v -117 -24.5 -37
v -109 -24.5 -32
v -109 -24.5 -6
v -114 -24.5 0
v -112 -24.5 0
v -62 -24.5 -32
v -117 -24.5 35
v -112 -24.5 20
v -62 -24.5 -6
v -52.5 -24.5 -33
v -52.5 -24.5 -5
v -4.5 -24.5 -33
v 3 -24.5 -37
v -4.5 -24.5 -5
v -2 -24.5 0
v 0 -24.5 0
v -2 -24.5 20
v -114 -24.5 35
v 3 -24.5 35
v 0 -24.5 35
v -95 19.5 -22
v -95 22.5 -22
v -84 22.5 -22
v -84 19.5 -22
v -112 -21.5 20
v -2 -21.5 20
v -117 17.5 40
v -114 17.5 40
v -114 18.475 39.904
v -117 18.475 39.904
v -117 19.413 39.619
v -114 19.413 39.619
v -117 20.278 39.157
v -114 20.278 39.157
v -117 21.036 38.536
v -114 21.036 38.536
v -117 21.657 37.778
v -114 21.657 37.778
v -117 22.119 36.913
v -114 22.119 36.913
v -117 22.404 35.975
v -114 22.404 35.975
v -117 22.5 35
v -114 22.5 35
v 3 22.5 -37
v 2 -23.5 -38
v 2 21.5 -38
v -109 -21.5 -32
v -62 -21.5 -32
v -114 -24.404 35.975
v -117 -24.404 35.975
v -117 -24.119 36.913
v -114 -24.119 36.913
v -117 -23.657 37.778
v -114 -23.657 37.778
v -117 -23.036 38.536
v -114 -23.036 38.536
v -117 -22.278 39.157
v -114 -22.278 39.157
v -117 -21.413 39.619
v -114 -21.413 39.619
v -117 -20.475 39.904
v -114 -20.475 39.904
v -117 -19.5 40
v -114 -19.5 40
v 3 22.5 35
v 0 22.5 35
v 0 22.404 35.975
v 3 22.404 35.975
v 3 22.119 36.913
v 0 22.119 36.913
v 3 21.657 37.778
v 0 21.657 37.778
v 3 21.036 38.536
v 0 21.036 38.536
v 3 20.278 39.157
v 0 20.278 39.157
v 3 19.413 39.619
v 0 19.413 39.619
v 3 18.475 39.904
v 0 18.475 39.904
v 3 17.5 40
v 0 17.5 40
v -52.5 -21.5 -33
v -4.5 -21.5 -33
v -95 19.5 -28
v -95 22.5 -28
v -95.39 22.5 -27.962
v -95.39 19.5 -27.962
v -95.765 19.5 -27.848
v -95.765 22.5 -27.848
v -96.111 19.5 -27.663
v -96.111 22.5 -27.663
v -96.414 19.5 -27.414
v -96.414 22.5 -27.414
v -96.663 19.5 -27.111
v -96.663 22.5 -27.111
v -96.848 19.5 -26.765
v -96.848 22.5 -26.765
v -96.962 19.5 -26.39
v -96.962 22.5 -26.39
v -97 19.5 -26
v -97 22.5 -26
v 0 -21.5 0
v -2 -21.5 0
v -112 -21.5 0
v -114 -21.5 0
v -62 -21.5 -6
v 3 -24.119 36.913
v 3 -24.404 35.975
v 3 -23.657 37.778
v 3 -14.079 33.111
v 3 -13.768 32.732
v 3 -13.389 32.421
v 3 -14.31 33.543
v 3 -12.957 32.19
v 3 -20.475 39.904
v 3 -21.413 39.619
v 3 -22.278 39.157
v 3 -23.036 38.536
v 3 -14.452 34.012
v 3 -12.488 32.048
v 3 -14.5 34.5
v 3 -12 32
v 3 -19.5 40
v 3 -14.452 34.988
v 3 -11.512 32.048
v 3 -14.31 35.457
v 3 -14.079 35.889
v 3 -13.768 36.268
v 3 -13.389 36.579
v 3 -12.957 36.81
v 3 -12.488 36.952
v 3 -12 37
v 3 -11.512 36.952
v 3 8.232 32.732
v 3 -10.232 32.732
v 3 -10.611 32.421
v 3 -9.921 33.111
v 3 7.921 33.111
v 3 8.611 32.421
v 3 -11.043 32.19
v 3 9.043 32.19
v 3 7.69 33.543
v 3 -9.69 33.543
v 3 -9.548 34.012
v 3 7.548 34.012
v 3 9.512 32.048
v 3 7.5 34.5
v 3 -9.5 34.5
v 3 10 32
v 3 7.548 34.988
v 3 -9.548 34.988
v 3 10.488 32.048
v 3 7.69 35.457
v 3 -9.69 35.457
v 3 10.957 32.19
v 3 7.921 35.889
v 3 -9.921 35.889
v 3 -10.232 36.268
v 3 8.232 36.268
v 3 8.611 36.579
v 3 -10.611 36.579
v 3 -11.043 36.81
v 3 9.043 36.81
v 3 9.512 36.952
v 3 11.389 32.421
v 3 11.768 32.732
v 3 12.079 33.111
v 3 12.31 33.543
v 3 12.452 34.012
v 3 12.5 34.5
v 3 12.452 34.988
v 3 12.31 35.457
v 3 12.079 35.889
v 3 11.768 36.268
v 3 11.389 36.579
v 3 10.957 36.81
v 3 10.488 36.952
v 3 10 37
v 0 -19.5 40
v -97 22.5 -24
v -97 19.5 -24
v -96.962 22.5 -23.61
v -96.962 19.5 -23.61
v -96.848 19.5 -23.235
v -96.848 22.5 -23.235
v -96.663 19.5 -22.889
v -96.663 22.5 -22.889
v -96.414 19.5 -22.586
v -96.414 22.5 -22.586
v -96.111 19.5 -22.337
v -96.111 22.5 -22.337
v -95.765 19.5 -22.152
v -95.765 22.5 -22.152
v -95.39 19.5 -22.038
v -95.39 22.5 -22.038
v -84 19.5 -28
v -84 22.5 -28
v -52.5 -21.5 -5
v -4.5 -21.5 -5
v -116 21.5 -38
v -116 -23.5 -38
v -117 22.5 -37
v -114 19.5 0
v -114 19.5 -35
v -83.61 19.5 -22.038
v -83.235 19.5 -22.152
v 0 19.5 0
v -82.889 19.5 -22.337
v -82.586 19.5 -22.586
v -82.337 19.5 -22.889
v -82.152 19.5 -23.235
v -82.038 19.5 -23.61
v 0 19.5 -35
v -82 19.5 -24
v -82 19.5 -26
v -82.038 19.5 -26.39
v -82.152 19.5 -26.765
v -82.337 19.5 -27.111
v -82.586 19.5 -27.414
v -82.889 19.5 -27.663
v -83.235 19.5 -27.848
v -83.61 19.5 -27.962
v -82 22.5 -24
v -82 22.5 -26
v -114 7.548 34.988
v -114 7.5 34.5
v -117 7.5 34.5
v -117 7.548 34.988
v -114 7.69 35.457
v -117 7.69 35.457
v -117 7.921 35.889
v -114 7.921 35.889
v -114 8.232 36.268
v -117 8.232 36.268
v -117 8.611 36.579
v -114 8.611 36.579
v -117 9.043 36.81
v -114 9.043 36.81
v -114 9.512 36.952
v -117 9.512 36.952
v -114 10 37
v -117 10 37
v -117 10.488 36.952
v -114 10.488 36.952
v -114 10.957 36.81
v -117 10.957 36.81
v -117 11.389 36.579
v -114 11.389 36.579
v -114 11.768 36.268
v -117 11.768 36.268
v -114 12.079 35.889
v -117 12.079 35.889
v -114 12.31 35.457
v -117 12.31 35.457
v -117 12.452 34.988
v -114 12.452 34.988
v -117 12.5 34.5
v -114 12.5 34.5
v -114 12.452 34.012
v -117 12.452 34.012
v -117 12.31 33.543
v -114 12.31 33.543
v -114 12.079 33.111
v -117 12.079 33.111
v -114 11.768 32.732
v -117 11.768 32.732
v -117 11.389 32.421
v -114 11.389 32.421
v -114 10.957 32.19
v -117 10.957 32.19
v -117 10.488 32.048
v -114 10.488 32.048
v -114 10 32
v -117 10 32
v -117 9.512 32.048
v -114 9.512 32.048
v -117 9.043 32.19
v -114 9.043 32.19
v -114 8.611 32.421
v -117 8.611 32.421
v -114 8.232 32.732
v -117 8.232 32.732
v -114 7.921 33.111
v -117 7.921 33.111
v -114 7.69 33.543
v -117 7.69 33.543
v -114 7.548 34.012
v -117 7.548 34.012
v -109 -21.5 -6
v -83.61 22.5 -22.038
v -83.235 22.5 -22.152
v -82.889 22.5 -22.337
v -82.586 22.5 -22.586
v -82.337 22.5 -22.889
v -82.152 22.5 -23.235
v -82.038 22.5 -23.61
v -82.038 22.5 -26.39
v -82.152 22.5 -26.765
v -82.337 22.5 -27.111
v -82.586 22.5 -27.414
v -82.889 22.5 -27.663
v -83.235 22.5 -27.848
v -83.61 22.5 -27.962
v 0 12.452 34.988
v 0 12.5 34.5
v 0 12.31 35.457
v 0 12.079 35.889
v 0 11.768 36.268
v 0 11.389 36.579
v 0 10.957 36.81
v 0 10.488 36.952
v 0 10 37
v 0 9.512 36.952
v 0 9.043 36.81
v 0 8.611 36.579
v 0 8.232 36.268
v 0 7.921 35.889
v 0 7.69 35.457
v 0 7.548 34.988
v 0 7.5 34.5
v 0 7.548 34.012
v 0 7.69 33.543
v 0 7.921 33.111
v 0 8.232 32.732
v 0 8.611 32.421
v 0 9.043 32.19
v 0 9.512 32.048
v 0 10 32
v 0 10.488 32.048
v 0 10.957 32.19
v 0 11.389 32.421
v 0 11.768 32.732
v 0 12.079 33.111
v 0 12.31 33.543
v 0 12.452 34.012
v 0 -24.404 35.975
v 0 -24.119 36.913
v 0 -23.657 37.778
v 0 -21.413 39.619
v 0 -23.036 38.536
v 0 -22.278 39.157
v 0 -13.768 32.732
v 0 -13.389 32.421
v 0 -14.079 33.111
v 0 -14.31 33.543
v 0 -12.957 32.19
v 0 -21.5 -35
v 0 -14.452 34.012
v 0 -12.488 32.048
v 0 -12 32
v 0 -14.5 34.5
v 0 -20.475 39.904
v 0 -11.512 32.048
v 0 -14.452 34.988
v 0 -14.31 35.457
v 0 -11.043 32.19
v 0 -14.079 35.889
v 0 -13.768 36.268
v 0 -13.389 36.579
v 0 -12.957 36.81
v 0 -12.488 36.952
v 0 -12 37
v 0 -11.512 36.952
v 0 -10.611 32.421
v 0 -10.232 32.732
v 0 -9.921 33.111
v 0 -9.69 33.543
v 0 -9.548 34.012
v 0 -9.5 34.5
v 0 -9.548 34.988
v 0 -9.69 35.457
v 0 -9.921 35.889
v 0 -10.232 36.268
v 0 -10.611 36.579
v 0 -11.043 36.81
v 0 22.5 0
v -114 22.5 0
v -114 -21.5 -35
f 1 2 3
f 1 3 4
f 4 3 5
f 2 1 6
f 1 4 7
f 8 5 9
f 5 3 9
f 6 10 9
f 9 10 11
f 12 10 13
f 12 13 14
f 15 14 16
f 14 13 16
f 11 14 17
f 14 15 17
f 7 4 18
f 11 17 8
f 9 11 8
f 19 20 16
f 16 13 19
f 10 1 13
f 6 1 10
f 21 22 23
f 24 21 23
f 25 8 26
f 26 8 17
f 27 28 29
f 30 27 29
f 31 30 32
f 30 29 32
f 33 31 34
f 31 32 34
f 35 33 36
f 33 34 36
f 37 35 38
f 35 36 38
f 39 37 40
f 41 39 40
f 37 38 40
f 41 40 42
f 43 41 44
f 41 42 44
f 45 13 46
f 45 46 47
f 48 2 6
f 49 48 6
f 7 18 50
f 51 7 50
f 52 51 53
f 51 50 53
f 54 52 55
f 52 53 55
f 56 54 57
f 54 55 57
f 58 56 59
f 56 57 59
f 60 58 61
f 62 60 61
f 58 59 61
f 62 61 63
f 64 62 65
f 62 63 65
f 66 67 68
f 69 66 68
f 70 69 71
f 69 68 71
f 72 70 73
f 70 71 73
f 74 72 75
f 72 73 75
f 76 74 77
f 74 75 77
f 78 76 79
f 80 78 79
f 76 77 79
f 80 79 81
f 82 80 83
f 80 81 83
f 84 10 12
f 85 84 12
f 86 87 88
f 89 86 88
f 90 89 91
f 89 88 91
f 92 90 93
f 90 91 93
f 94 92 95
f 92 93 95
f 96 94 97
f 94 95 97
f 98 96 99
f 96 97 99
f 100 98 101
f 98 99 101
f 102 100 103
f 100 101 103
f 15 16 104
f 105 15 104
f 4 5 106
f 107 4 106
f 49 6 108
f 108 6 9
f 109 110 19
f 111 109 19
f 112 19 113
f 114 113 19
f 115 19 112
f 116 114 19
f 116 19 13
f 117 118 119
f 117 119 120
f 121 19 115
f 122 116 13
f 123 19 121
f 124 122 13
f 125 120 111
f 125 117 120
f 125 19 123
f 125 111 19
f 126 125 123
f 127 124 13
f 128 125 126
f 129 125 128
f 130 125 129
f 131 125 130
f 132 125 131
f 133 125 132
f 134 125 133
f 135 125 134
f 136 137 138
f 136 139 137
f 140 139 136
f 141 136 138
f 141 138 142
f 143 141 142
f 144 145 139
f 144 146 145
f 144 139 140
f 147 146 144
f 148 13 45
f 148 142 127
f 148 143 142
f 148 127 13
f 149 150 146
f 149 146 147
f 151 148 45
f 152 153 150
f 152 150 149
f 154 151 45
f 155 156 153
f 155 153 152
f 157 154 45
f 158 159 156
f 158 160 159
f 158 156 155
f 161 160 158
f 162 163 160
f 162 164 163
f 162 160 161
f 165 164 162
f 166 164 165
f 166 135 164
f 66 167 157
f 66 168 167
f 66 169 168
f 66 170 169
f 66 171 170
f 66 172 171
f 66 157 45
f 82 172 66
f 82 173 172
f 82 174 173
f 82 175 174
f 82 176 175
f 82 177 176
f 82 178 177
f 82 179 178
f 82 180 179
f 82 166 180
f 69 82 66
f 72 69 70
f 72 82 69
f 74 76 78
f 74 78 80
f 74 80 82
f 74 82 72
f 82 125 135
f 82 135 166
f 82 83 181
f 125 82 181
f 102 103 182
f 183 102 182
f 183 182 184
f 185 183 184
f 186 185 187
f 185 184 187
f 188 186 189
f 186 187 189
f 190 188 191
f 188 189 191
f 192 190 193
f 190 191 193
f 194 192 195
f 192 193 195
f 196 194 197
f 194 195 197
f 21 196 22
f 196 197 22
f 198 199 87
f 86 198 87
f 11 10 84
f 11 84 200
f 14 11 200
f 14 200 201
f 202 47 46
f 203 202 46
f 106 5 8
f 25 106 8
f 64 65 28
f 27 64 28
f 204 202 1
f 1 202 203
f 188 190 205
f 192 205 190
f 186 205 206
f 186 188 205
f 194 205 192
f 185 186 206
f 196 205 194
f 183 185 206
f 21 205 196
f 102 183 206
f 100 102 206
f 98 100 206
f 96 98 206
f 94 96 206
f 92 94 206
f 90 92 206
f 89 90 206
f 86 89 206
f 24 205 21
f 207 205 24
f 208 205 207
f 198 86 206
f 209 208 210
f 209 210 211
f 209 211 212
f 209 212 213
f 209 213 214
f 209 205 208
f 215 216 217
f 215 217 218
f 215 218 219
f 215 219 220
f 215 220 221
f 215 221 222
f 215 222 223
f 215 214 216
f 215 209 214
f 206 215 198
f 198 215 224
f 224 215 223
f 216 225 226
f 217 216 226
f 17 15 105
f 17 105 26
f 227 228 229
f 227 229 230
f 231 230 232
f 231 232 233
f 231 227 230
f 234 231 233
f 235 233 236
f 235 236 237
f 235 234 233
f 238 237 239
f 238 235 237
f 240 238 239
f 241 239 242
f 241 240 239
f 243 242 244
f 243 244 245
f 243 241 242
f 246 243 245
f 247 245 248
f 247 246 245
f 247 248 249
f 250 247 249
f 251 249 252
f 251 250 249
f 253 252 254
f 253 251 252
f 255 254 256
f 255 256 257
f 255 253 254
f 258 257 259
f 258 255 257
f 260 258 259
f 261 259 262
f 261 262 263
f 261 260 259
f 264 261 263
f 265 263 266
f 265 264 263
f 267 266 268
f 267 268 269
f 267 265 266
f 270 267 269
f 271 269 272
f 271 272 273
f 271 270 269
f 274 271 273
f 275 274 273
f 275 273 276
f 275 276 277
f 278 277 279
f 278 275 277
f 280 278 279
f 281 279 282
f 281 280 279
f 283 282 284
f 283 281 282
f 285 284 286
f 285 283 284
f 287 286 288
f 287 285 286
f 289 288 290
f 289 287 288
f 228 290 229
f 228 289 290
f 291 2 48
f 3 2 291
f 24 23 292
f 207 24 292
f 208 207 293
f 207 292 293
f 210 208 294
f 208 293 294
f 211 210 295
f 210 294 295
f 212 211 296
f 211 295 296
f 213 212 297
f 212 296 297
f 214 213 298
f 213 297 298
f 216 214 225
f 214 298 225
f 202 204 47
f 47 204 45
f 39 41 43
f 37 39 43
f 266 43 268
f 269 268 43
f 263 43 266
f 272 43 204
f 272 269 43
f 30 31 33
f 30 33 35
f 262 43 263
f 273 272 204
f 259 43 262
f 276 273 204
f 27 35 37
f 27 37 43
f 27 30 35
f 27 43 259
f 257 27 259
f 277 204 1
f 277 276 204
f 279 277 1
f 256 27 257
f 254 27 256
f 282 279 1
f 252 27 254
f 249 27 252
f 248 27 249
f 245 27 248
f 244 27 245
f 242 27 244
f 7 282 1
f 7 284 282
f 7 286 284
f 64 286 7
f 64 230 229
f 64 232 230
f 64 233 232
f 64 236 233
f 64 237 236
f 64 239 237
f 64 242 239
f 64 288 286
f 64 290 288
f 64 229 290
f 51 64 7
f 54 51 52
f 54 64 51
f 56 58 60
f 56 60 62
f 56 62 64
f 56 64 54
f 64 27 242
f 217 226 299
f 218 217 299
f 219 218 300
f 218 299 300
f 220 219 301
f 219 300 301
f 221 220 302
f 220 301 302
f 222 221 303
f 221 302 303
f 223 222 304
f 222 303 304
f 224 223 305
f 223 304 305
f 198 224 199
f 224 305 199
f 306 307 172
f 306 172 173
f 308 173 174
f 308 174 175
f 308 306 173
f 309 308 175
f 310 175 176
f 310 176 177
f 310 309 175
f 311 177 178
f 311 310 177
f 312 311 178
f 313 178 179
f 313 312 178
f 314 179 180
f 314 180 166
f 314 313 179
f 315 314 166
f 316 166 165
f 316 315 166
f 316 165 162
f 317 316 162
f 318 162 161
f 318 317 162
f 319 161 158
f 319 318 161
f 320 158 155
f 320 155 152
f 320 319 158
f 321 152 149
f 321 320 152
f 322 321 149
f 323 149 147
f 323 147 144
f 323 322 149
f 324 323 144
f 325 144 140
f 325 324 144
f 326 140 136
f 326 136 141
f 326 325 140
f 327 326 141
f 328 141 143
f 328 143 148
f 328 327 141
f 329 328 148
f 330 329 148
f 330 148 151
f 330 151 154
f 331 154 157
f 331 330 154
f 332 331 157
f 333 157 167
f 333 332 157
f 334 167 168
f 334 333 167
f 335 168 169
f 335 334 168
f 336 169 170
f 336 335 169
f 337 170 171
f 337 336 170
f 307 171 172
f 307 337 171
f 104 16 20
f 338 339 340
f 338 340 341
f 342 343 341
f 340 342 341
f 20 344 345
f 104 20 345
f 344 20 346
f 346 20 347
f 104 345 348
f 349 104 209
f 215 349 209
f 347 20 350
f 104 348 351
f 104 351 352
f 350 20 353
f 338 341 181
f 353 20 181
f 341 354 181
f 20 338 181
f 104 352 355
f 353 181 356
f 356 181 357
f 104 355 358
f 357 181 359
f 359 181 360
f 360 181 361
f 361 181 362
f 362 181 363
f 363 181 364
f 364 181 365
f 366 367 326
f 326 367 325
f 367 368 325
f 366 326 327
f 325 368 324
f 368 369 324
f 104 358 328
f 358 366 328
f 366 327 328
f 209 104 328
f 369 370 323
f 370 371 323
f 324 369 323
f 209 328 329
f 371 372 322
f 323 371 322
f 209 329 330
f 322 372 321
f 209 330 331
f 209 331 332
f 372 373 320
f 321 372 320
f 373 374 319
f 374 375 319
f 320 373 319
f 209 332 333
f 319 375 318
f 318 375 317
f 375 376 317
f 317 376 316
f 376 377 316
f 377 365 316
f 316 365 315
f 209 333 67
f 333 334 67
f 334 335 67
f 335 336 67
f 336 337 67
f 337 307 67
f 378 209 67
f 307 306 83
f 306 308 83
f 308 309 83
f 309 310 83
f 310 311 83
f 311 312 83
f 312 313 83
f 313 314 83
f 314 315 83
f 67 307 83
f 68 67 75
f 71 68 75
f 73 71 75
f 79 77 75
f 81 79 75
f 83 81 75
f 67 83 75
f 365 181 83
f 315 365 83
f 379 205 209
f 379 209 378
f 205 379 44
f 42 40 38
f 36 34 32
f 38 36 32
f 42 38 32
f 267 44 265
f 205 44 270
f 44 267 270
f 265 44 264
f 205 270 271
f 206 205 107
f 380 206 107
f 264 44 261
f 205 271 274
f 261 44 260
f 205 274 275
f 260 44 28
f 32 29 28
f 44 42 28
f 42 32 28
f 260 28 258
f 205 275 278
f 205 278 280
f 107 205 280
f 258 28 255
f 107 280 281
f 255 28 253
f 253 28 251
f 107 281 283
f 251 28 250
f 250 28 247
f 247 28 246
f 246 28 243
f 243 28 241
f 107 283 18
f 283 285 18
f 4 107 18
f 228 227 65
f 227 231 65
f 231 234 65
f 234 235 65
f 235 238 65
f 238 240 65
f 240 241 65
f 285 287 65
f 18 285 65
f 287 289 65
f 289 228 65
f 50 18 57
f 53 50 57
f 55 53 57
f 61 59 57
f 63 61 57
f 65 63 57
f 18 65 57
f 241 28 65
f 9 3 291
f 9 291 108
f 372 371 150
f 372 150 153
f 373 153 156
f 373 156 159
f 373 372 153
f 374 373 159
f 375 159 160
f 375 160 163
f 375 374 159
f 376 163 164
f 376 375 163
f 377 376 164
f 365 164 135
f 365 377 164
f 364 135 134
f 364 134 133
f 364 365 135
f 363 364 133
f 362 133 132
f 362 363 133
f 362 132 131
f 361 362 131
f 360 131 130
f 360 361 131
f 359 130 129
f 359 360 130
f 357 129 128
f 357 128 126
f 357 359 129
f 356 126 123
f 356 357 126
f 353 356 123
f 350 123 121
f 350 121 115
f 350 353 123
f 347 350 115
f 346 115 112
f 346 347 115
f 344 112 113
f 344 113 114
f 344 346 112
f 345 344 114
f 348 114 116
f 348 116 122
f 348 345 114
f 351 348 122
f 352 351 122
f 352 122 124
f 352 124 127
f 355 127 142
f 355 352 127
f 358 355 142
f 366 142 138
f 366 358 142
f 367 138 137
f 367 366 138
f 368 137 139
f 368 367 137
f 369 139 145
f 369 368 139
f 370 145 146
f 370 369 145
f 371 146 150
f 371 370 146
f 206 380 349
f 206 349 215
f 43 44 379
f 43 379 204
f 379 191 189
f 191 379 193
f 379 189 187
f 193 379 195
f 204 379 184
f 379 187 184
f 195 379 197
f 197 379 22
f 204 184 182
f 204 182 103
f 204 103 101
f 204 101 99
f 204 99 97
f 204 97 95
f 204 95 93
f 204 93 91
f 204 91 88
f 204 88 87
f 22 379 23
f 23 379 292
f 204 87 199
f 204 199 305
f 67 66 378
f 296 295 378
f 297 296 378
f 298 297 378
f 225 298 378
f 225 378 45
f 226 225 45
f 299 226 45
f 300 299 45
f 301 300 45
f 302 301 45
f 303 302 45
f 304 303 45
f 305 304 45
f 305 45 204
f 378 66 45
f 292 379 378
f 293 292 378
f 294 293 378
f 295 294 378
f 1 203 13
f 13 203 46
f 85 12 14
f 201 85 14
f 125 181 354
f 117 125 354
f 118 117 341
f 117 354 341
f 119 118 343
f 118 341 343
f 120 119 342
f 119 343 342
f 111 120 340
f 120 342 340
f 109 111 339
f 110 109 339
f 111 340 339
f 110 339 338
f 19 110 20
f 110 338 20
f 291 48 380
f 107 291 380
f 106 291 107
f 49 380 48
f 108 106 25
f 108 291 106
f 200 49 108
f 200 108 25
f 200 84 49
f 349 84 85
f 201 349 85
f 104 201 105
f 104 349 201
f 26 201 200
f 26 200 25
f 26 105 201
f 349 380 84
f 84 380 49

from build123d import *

# Parameters (mm, degrees)
F2_R      = 2.5
F3_DEPTH  = 3
F4_W      = 3
F4_H      = 35
F4_H_2    = 3
F4_W_2    = 41
F5_DEPTH  = 114
F6_R      = 2.5
F7_DEPTH  = 3
F8_W      = 110
F8_H      = 20
F9_DEPTH  = 3
F10_W     = 47
F10_H     = 26
F10_W_2   = 48
F10_H_2   = 28
F11_DEPTH = 3
F13_DEPTH = 3
F14_SIZE  = 1


with BuildPart() as f3:
    # F2 (on Right) → F3 (new body)
    with BuildSketch(Plane.YZ):
        with BuildLine():
            ThreePointArc((22.5, 35), (21.0355339059, 38.5355339059), (17.5, 40))
            Line((17.5, 40), (-19.5, 40))
            ThreePointArc((-19.5, 40), (-23.0355339059, 38.5355339059), (-24.5, 35))
            Line((-24.5, 35), (-24.5, -38))
            Line((-24.5, -38), (22.5, -38))
            Line((22.5, -38), (22.5, 35))
        make_face()
        with Locations((-12, 34.5)):
            Circle(F2_R, mode=Mode.SUBTRACT)
        with Locations((10, 34.5)):
            Circle(F2_R, mode=Mode.SUBTRACT)
    extrude(amount=F3_DEPTH)

    # F4 (on Right) → F5 (join)
    with BuildSketch(Plane.YZ):
        with Locations((-23, -17.5)):
            Rectangle(F4_W, F4_H)
        with Locations((21, -36.5)):
            Rectangle(F4_W, F4_H_2)
        with Locations((21, -17.5)):
            Rectangle(F4_W, F4_H)
        with Locations((-1, -36.5)):
            Rectangle(F4_W_2, F4_H_2)
        with Locations((-23, -36.5)):
            Rectangle(F4_W, F4_H_2)
    extrude(amount=-F5_DEPTH)

    # F6 (on face) → F7 (join)
    with BuildSketch(Plane(origin=(-114, 0, 0), x_dir=(0, -1, 0), z_dir=(-1, 0, 0))):
        with BuildLine():
            ThreePointArc((24.5, 35), (23.0355339059, 38.5355339059), (19.5, 40))
            Line((19.5, 40), (-17.5, 40))
            ThreePointArc((-17.5, 40), (-21.0355339059, 38.5355339059), (-22.5, 35))
            Line((-22.5, 35), (-22.5, -38))
            Line((-22.5, -38), (24.5, -38))
            Line((24.5, -38), (24.5, 35))
        make_face()
        with Locations((-10, 34.5)):
            Circle(F6_R, mode=Mode.SUBTRACT)
    extrude(amount=F7_DEPTH)

    # F8 (on face) → F9 (join)
    with BuildSketch(Plane.XZ.offset(24.5)):
        with Locations((-57, 10)):
            Rectangle(F8_W, F8_H)
    extrude(amount=-F9_DEPTH)

    # F10 (on face) → F11 (cut, through all)
    with BuildSketch(Plane.XZ.offset(24.5)):
        with Locations((-85.5, -19)):
            Rectangle(F10_W, F10_H)
        with Locations((-28.5, -19)):
            Rectangle(F10_W_2, F10_H_2)
    extrude(amount=-F11_DEPTH, mode=Mode.SUBTRACT)

    # F12 (on face) → F13 (cut, through all)
    with BuildSketch(Plane(origin=(0, 22.5, 0), x_dir=(-1, 0, 0), z_dir=(0, 1, 0))):
        with BuildLine():
            ThreePointArc((82, -26), (82.5857864376, -27.4142135624), (84, -28))
            Line((84, -28), (95, -28))
            ThreePointArc((95, -28), (96.4142135624, -27.4142135624), (97, -26))
            Line((97, -26), (97, -24))
            ThreePointArc((97, -24), (96.4142135624, -22.5857864376), (95, -22))
            Line((95, -22), (84, -22))
            ThreePointArc((84, -22), (82.5857864376, -22.5857864376), (82, -24))
            Line((82, -24), (82, -26))
        make_face()
    extrude(amount=-F13_DEPTH, mode=Mode.SUBTRACT)

    # F14
    f14_edges = [f3.edges().sort_by_distance(p)[0] for p in [
        (-57, -24.5, -38),
        (3, -1, -38),
        (-57, 22.5, -38),
        (-117, -1, -38),
    ]]
    chamfer(f14_edges, length=F14_SIZE)


solid = f3.part
